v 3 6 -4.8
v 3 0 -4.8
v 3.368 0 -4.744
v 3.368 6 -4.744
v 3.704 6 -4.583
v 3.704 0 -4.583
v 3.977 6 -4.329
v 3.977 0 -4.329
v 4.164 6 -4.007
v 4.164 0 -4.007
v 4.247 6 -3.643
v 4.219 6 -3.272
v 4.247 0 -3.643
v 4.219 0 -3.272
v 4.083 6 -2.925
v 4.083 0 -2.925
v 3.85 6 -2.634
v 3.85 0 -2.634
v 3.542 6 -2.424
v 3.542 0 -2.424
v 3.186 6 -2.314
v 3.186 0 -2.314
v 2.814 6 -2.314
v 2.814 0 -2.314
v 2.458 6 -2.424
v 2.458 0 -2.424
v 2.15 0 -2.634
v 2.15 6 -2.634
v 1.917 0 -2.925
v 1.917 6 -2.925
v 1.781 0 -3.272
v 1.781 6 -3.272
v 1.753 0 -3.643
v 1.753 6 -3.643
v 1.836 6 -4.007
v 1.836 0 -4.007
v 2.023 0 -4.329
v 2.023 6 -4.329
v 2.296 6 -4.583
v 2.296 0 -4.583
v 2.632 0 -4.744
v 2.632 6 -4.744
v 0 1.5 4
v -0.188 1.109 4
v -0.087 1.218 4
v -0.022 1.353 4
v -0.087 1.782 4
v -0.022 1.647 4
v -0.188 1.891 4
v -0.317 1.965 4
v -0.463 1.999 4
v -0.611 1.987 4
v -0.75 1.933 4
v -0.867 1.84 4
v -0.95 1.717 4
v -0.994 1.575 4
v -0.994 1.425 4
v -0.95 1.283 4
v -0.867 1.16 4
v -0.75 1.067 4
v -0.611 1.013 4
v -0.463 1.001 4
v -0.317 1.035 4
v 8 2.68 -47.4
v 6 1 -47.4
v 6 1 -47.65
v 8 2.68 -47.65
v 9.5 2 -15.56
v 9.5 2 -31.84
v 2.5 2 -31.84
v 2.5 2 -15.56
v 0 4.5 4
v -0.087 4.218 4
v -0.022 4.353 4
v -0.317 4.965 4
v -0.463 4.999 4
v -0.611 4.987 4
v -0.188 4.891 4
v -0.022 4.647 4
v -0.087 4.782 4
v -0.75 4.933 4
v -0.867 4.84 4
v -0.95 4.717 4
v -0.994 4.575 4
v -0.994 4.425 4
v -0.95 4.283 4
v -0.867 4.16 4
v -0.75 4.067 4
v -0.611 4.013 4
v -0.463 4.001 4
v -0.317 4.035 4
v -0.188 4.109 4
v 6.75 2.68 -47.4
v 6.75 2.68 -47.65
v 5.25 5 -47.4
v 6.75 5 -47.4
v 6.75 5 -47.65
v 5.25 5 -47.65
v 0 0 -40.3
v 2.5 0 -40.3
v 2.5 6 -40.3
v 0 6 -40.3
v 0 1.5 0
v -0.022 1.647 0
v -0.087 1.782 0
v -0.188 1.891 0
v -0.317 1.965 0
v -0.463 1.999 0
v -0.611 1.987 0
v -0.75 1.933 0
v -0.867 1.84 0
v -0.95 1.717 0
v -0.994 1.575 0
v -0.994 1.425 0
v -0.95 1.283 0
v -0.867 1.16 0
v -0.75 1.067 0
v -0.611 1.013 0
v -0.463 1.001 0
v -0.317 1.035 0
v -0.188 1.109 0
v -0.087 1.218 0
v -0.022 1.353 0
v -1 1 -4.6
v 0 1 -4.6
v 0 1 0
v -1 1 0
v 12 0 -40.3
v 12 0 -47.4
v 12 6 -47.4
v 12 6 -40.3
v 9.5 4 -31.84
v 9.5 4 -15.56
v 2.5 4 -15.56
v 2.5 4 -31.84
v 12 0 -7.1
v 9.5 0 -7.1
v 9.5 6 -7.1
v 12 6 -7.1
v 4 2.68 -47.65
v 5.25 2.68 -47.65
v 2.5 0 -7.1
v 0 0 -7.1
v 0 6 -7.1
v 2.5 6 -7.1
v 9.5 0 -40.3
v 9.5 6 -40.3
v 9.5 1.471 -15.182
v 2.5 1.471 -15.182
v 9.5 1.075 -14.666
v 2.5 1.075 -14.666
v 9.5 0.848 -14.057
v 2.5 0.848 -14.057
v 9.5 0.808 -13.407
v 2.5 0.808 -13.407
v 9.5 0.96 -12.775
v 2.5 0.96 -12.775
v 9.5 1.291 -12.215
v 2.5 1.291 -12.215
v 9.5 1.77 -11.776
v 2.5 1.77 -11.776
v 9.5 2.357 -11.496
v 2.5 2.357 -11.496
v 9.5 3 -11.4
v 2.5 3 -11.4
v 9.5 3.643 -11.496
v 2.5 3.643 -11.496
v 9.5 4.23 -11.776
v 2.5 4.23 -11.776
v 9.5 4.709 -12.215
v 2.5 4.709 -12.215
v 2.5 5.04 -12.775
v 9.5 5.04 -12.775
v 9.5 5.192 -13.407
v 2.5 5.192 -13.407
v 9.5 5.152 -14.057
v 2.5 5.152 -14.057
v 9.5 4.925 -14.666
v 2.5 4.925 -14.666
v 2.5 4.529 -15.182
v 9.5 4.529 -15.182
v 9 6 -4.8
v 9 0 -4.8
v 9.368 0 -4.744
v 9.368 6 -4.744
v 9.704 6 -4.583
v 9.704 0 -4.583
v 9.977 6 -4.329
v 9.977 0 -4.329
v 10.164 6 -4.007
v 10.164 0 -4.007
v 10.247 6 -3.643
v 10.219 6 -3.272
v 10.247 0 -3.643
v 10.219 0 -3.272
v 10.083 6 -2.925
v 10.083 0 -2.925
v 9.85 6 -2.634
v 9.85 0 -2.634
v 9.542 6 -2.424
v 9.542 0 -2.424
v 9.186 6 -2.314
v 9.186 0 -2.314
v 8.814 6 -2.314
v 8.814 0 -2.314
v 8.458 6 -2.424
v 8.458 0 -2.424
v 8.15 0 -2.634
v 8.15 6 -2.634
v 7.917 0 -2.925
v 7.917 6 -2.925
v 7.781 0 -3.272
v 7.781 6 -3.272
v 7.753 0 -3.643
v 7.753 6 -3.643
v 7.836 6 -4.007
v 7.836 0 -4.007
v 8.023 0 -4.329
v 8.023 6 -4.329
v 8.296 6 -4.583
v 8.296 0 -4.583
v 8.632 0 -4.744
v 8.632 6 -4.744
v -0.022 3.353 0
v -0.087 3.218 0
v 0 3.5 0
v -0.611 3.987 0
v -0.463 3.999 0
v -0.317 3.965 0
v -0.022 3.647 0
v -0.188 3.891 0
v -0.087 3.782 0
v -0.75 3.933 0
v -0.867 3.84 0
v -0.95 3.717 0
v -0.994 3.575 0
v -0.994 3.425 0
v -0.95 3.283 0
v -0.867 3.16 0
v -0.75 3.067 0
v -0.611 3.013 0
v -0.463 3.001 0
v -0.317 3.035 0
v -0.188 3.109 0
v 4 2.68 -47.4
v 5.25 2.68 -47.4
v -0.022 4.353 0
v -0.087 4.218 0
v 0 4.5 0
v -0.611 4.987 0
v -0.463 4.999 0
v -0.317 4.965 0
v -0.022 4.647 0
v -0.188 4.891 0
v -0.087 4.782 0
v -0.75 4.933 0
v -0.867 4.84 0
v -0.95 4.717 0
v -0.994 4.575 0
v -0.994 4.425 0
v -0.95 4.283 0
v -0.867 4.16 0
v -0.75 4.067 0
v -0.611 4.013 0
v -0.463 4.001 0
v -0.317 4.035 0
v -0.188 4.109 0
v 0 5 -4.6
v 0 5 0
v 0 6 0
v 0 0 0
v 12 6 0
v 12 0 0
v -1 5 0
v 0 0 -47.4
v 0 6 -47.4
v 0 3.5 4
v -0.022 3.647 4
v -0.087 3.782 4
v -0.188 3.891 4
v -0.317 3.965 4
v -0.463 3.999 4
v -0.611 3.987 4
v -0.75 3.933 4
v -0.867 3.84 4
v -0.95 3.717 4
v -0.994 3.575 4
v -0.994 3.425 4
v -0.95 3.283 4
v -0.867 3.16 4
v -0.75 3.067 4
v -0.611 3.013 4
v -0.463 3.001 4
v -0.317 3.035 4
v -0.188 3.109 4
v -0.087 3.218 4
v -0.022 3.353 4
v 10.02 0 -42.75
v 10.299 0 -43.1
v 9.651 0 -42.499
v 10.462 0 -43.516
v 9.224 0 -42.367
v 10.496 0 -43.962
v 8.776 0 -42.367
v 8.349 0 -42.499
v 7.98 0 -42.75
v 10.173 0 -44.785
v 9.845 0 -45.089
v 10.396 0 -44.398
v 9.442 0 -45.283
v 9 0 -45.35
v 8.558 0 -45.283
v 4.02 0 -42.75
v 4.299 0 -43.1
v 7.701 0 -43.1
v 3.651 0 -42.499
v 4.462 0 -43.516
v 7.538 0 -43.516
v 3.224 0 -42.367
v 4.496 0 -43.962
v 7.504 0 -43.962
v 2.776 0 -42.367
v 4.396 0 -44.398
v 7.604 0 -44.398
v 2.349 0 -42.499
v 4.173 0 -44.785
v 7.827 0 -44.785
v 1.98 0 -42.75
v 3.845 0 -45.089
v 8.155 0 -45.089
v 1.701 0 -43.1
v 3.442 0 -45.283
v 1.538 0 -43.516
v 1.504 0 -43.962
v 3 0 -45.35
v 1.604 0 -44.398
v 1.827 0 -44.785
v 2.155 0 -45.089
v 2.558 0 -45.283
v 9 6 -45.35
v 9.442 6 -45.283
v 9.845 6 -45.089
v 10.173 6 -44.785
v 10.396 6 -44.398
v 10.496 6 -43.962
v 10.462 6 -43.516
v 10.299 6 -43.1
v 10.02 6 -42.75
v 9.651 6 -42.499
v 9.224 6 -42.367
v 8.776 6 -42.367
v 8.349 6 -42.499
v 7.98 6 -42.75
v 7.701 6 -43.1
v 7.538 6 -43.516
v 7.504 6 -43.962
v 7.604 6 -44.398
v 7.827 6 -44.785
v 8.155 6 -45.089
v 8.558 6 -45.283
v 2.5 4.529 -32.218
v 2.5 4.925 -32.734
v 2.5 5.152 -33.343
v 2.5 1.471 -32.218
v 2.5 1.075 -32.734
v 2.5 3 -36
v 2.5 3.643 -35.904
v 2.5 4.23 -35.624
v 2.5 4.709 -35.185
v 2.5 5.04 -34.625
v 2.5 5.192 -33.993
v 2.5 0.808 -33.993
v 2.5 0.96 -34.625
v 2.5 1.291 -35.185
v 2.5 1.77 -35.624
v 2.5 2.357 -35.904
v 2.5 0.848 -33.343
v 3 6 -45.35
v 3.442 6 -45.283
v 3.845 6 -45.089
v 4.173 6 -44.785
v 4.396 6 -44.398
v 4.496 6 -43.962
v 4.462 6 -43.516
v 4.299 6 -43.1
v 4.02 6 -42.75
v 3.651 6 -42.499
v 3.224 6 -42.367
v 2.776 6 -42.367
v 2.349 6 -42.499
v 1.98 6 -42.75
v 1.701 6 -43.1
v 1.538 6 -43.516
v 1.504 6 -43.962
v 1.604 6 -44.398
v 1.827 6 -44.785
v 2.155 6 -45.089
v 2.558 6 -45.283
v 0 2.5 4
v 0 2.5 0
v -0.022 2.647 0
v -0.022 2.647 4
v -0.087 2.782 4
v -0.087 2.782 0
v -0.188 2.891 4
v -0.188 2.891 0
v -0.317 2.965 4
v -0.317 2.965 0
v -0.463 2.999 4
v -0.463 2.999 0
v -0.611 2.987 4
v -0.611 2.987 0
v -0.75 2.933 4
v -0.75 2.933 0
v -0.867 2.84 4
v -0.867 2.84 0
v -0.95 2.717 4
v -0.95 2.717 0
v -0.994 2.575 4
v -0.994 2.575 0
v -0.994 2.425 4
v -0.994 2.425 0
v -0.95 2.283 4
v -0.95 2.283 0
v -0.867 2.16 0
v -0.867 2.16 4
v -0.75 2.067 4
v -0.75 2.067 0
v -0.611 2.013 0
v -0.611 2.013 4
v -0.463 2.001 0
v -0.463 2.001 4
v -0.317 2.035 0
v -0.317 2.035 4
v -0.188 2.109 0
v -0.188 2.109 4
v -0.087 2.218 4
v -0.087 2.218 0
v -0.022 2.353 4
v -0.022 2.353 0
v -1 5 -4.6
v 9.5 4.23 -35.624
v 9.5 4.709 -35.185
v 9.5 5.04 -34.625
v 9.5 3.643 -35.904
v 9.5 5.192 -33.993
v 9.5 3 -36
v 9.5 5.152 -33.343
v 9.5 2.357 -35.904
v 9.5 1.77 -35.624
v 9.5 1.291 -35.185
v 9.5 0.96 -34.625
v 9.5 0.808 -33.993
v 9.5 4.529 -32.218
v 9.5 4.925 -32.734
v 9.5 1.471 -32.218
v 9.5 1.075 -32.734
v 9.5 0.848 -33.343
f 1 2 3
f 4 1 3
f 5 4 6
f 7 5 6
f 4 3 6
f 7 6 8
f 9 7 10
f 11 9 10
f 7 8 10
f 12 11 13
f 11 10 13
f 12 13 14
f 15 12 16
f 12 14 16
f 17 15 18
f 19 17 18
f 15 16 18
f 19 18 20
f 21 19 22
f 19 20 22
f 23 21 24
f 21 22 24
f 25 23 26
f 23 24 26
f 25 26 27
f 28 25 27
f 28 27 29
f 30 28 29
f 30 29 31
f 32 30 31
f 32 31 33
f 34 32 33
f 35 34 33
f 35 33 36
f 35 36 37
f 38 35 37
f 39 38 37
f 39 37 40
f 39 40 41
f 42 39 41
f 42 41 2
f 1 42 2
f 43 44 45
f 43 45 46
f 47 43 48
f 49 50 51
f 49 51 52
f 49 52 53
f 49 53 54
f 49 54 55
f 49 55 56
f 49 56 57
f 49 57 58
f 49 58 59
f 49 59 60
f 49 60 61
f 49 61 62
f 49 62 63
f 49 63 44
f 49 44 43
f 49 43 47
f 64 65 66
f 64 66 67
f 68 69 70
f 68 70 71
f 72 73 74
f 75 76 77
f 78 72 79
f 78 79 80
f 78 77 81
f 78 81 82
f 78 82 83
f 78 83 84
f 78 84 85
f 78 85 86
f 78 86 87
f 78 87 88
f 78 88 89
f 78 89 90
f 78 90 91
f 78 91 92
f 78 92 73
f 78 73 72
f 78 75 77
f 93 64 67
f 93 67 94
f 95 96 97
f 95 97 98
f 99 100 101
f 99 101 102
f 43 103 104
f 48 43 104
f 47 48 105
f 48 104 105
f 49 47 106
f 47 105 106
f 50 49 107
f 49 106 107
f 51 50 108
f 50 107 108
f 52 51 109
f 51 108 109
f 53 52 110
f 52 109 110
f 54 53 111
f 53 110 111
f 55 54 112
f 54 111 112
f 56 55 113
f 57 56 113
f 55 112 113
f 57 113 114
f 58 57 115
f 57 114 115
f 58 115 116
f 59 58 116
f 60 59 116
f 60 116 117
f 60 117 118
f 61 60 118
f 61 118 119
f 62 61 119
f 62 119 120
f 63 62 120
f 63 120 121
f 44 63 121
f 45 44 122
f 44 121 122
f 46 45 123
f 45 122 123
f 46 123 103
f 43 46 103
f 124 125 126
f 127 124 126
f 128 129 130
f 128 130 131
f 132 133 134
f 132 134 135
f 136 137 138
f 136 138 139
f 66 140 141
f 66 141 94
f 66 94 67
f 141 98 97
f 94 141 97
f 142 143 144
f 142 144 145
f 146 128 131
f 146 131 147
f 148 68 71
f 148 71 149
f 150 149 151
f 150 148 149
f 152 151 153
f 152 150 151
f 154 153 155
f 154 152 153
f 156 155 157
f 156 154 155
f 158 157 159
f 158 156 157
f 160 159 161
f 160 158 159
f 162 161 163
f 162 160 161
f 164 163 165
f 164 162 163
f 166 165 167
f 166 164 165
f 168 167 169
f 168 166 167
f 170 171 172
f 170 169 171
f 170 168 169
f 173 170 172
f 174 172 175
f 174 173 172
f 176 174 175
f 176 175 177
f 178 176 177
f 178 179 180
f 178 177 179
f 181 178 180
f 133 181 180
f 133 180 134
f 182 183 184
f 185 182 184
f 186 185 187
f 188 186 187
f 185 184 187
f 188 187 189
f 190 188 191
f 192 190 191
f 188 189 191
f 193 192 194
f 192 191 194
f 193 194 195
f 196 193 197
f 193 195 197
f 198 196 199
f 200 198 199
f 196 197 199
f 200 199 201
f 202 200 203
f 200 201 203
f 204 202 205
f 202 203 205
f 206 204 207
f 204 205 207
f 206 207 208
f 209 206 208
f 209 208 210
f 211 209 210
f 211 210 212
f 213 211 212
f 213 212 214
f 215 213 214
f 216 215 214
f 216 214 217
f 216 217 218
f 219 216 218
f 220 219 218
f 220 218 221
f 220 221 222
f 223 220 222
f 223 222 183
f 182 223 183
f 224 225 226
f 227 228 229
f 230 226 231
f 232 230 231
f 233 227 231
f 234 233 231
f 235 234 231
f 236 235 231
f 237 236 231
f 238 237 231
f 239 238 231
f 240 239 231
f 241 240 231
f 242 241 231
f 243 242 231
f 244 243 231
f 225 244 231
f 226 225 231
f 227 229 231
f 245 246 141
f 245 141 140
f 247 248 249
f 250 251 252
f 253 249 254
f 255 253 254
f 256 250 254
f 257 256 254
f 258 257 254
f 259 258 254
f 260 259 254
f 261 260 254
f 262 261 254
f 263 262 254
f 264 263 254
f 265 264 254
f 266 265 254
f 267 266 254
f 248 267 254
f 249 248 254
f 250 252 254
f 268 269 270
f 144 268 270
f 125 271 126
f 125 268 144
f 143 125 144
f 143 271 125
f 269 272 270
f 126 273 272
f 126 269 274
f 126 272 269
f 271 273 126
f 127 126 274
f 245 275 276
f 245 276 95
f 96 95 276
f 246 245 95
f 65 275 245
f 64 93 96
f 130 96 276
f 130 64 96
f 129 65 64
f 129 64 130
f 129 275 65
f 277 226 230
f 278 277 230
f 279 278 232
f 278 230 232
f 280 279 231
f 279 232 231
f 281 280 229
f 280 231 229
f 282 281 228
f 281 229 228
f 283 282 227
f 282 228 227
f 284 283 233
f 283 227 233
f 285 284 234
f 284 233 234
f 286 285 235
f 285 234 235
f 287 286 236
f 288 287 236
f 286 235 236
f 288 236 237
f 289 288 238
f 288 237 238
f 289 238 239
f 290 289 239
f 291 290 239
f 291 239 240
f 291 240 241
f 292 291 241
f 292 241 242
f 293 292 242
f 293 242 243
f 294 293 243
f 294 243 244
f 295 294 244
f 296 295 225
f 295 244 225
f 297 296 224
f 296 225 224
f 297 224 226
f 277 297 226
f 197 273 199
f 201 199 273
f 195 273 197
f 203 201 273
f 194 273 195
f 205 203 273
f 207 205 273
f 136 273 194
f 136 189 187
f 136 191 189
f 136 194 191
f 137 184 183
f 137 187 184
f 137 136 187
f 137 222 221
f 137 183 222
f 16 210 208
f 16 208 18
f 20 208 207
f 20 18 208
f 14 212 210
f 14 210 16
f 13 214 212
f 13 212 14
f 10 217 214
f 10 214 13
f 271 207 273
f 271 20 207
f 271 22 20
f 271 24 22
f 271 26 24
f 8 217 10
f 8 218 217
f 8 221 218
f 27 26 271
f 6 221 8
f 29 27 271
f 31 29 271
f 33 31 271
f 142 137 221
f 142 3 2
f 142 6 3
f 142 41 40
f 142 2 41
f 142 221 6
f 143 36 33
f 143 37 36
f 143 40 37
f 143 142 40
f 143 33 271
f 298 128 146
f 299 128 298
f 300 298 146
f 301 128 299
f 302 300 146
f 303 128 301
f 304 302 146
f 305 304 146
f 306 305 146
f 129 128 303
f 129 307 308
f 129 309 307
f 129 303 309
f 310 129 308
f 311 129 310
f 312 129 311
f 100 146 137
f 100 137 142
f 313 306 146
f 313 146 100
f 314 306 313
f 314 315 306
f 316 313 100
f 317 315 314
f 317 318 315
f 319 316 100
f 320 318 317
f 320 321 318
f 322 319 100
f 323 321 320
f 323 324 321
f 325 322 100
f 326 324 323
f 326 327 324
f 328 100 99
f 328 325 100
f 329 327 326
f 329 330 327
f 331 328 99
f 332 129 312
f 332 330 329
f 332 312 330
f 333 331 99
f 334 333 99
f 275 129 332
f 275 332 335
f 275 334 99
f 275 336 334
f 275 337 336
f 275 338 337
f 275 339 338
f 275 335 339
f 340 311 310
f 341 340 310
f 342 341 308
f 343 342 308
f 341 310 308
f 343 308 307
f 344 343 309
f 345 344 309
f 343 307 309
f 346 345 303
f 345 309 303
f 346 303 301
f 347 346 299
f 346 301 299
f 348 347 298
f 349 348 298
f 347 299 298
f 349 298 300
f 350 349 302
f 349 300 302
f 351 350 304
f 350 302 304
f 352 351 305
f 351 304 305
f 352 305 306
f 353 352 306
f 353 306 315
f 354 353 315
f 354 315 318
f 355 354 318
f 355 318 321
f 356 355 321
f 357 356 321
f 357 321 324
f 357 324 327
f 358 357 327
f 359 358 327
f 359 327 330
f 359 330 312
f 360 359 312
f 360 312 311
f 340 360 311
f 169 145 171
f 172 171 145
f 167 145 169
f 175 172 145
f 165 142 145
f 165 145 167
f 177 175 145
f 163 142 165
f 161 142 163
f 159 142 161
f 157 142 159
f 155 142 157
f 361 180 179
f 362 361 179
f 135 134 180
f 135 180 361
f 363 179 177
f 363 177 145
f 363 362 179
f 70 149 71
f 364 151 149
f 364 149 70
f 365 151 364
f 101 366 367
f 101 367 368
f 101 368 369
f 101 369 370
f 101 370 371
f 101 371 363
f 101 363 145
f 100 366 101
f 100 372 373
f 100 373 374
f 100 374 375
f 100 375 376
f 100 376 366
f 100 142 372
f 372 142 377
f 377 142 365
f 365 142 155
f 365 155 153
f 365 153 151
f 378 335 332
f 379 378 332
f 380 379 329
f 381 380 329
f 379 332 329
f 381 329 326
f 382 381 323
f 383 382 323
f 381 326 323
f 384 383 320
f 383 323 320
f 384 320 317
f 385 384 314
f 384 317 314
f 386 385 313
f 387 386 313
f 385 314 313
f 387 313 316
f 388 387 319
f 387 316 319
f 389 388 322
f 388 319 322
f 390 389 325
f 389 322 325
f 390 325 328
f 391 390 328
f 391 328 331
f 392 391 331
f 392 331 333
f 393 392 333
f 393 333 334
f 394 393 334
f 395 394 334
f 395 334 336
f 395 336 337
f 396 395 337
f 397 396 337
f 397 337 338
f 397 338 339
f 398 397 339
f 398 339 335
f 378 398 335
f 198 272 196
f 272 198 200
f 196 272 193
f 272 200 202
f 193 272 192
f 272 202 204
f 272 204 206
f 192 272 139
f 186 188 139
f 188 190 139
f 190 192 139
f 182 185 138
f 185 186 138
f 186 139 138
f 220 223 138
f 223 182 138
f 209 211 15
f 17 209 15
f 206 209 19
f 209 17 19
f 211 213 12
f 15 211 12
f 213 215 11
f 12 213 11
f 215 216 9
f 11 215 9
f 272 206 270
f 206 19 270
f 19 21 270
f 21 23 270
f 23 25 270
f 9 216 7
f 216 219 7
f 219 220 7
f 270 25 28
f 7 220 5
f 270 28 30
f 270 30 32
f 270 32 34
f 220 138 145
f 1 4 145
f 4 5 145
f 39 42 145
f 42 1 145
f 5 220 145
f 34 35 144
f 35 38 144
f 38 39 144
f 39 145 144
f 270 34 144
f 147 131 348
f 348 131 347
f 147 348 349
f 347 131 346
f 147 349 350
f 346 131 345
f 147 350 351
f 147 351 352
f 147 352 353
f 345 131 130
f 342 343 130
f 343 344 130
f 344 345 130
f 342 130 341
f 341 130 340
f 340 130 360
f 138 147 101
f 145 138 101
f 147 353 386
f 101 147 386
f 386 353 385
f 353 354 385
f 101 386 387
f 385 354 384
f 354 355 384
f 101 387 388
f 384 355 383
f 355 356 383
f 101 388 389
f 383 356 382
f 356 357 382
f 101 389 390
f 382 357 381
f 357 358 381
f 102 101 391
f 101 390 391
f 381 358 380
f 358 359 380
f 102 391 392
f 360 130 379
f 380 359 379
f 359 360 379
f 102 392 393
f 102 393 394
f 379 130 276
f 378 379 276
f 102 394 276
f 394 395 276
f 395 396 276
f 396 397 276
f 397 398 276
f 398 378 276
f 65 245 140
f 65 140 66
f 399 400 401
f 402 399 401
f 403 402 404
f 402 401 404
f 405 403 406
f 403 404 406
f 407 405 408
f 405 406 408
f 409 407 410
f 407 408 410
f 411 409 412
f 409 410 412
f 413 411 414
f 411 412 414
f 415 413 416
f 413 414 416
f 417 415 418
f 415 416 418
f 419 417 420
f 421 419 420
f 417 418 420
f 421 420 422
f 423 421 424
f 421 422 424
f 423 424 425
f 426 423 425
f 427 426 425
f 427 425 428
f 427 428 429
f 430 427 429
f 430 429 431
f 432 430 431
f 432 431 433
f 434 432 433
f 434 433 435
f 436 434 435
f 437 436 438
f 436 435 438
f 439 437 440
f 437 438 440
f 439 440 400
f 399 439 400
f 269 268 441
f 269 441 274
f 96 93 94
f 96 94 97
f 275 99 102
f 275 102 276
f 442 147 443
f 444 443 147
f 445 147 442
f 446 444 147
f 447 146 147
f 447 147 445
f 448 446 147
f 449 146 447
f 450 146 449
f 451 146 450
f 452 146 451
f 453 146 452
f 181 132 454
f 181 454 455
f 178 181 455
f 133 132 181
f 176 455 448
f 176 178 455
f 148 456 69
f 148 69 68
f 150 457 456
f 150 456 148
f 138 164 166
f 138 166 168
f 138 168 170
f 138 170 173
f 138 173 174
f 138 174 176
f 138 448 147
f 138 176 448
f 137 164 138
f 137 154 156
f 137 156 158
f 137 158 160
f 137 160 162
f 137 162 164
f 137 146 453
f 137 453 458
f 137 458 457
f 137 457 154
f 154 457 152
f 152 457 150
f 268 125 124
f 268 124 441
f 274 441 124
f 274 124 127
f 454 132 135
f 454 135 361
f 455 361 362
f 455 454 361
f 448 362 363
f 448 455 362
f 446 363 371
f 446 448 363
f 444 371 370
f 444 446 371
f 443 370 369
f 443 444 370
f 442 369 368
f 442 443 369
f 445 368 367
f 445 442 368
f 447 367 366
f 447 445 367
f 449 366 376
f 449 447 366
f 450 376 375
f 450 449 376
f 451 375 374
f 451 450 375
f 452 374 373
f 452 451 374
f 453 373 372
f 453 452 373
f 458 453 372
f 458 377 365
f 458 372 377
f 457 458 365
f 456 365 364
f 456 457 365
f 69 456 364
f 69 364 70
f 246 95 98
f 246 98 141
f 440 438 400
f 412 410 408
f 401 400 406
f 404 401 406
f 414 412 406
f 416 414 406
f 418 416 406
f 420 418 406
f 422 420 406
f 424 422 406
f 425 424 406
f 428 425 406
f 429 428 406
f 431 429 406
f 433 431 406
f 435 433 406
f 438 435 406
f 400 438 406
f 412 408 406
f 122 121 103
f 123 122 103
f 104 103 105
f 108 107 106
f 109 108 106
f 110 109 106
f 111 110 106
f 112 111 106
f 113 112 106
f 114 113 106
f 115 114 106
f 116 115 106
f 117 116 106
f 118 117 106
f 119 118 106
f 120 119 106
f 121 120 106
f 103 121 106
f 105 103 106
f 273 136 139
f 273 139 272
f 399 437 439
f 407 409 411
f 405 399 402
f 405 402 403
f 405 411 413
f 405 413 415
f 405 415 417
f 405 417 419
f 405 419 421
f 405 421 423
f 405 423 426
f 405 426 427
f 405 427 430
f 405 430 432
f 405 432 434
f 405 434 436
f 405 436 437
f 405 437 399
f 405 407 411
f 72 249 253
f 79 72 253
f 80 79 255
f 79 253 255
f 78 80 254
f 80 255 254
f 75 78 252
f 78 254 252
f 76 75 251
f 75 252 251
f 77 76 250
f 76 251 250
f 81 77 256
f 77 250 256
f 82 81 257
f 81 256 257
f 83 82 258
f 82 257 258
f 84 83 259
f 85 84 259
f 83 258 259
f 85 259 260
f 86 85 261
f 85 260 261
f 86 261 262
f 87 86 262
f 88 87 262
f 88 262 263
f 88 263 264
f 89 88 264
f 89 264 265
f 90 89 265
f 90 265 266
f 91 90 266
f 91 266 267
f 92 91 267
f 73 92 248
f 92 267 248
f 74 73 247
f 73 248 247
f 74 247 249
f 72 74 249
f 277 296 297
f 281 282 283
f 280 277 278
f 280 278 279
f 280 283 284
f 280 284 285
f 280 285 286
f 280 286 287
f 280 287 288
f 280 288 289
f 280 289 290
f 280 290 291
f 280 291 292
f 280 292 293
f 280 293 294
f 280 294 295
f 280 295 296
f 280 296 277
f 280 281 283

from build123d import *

# Parameters (mm, degrees)
BOSS_EXTRUDE1_DEPTH     = 6
F_3_0MM_DOWEL_HOLE1_D   = 3
TAP_DRILL_FOR_M3_TAP1_D = 2.5
BOSS_EXTRUDE2_DEPTH     = 0.25
CUT_EXTRUDE1_REACH      = 50.957
SKETCH7_W               = 4.6
SKETCH7_H               = 4
BOSS_EXTRUDE3_DEPTH     = 1
SKETCH8_R               = 0.5
BOSS_EXTRUDE5_DEPTH     = 4
BOSS_EXTRUDE5_2_DEPTH   = 4
BOSS_EXTRUDE5_3_DEPTH   = 4
BOSS_EXTRUDE5_4_DEPTH   = 4


with BuildPart() as part:
    # Sketch1 → Boss-Extrude1 (new body)
    with BuildSketch(Plane(origin=(0, 0, 0), x_dir=(1, 0, 0), z_dir=(0, 1, 0))):
        Polygon((2.5, 7.1), (2.5, 40.3), (0, 40.3), (0, 47.4), (12, 47.4), (12, 40.3), (9.5, 40.3), (9.5, 7.1), (12, 7.1), (12, 0), (0, 0), (0, 7.1), align=None)
    extrude(amount=BOSS_EXTRUDE1_DEPTH)

    # Ø3.0mm Dowel Hole1 (through all)
    with Locations(Plane(origin=(3, 6, -43.85), x_dir=(0, 0, 1), z_dir=(0, 1, 0))):
        with Locations((0, 0), (0, 6)):
            Hole(F_3_0MM_DOWEL_HOLE1_D / 2)

    # Tap Drill for M3 Tap1 (through all)
    with Locations(Plane(origin=(9, 6, -3.55), x_dir=(0, 0, 1), z_dir=(0, 1, 0))):
        with Locations((0, 0), (0, -6)):
            Hole(TAP_DRILL_FOR_M3_TAP1_D / 2)

    # Sketch5 → Boss-Extrude2 (add)
    with BuildSketch(Plane(origin=(0, 0, -47.4), x_dir=(-1, 0, 0), z_dir=(0, 0, -1))):
        Polygon((-6.75, 5), (-5.25, 5), (-5.25, 2.680048343), (-4, 2.680048343), (-6, 1), (-8, 2.680048343), (-6.75, 2.680048343), align=None)
    extrude(amount=BOSS_EXTRUDE2_DEPTH)

    # Sketch6 → Cut-Extrude1 (cut, up to next)
    with BuildSketch(Plane(origin=(9.5, 0, 0), x_dir=(0, 0, -1), z_dir=(1, 0, 0)), mode=Mode.PRIVATE) as cut_extrude1_sk1:
        with BuildLine():
            Line((15.559591794, 4), (31.840408206, 4))
            ThreePointArc((31.840408206, 4), (36, 3), (31.840408206, 2))
            Line((31.840408206, 2), (15.559591794, 2))
            ThreePointArc((15.559591794, 2), (11.4, 3), (15.559591794, 4))
        make_face()
    cut_extrude1_tool1 = extrude(cut_extrude1_sk1.sketch, amount=-CUT_EXTRUDE1_REACH, mode=Mode.PRIVATE) & part.part
    add(cut_extrude1_tool1.solids().sort_by_distance((9.5, 3, -23.7))[0], mode=Mode.SUBTRACT)

    # Sketch7 → Boss-Extrude3 (add)
    with BuildSketch(Plane.ZY):
        with Locations((-2.3, 3)):
            Rectangle(SKETCH7_W, SKETCH7_H)
    extrude(amount=BOSS_EXTRUDE3_DEPTH)


with BuildPart() as body_2:
    # Sketch8 → Boss-Extrude5 (new body)
    with BuildSketch(Plane.XY):
        with Locations((-0.5, 4.5)):
            Circle(SKETCH8_R)
    extrude(amount=BOSS_EXTRUDE5_DEPTH)


with BuildPart() as body_3:
    # Sketch8 → Boss-Extrude5 2 (new body)
    with BuildSketch(Plane.XY):
        with Locations((-0.5, 1.5)):
            Circle(SKETCH8_R)
    extrude(amount=BOSS_EXTRUDE5_2_DEPTH)


with BuildPart() as body_4:
    # Sketch8 → Boss-Extrude5 3 (new body)
    with BuildSketch(Plane.XY):
        with BuildLine():
            ThreePointArc((-0.5, 2), (0, 2.5), (-0.5, 3))
            ThreePointArc((-0.5, 3), (-1, 2.5), (-0.5, 2))
        make_face()
    extrude(amount=BOSS_EXTRUDE5_3_DEPTH)


with BuildPart() as body_5:
    # Sketch8 → Boss-Extrude5 4 (new body)
    with BuildSketch(Plane.XY):
        with BuildLine():
            ThreePointArc((-0.5, 3), (0, 3.5), (-0.5, 4))
            ThreePointArc((-0.5, 4), (-1, 3.5), (-0.5, 3))
        make_face()
    extrude(amount=BOSS_EXTRUDE5_4_DEPTH)


solid = Compound([part.part, body_2.part, body_3.part, body_4.part, body_5.part])
